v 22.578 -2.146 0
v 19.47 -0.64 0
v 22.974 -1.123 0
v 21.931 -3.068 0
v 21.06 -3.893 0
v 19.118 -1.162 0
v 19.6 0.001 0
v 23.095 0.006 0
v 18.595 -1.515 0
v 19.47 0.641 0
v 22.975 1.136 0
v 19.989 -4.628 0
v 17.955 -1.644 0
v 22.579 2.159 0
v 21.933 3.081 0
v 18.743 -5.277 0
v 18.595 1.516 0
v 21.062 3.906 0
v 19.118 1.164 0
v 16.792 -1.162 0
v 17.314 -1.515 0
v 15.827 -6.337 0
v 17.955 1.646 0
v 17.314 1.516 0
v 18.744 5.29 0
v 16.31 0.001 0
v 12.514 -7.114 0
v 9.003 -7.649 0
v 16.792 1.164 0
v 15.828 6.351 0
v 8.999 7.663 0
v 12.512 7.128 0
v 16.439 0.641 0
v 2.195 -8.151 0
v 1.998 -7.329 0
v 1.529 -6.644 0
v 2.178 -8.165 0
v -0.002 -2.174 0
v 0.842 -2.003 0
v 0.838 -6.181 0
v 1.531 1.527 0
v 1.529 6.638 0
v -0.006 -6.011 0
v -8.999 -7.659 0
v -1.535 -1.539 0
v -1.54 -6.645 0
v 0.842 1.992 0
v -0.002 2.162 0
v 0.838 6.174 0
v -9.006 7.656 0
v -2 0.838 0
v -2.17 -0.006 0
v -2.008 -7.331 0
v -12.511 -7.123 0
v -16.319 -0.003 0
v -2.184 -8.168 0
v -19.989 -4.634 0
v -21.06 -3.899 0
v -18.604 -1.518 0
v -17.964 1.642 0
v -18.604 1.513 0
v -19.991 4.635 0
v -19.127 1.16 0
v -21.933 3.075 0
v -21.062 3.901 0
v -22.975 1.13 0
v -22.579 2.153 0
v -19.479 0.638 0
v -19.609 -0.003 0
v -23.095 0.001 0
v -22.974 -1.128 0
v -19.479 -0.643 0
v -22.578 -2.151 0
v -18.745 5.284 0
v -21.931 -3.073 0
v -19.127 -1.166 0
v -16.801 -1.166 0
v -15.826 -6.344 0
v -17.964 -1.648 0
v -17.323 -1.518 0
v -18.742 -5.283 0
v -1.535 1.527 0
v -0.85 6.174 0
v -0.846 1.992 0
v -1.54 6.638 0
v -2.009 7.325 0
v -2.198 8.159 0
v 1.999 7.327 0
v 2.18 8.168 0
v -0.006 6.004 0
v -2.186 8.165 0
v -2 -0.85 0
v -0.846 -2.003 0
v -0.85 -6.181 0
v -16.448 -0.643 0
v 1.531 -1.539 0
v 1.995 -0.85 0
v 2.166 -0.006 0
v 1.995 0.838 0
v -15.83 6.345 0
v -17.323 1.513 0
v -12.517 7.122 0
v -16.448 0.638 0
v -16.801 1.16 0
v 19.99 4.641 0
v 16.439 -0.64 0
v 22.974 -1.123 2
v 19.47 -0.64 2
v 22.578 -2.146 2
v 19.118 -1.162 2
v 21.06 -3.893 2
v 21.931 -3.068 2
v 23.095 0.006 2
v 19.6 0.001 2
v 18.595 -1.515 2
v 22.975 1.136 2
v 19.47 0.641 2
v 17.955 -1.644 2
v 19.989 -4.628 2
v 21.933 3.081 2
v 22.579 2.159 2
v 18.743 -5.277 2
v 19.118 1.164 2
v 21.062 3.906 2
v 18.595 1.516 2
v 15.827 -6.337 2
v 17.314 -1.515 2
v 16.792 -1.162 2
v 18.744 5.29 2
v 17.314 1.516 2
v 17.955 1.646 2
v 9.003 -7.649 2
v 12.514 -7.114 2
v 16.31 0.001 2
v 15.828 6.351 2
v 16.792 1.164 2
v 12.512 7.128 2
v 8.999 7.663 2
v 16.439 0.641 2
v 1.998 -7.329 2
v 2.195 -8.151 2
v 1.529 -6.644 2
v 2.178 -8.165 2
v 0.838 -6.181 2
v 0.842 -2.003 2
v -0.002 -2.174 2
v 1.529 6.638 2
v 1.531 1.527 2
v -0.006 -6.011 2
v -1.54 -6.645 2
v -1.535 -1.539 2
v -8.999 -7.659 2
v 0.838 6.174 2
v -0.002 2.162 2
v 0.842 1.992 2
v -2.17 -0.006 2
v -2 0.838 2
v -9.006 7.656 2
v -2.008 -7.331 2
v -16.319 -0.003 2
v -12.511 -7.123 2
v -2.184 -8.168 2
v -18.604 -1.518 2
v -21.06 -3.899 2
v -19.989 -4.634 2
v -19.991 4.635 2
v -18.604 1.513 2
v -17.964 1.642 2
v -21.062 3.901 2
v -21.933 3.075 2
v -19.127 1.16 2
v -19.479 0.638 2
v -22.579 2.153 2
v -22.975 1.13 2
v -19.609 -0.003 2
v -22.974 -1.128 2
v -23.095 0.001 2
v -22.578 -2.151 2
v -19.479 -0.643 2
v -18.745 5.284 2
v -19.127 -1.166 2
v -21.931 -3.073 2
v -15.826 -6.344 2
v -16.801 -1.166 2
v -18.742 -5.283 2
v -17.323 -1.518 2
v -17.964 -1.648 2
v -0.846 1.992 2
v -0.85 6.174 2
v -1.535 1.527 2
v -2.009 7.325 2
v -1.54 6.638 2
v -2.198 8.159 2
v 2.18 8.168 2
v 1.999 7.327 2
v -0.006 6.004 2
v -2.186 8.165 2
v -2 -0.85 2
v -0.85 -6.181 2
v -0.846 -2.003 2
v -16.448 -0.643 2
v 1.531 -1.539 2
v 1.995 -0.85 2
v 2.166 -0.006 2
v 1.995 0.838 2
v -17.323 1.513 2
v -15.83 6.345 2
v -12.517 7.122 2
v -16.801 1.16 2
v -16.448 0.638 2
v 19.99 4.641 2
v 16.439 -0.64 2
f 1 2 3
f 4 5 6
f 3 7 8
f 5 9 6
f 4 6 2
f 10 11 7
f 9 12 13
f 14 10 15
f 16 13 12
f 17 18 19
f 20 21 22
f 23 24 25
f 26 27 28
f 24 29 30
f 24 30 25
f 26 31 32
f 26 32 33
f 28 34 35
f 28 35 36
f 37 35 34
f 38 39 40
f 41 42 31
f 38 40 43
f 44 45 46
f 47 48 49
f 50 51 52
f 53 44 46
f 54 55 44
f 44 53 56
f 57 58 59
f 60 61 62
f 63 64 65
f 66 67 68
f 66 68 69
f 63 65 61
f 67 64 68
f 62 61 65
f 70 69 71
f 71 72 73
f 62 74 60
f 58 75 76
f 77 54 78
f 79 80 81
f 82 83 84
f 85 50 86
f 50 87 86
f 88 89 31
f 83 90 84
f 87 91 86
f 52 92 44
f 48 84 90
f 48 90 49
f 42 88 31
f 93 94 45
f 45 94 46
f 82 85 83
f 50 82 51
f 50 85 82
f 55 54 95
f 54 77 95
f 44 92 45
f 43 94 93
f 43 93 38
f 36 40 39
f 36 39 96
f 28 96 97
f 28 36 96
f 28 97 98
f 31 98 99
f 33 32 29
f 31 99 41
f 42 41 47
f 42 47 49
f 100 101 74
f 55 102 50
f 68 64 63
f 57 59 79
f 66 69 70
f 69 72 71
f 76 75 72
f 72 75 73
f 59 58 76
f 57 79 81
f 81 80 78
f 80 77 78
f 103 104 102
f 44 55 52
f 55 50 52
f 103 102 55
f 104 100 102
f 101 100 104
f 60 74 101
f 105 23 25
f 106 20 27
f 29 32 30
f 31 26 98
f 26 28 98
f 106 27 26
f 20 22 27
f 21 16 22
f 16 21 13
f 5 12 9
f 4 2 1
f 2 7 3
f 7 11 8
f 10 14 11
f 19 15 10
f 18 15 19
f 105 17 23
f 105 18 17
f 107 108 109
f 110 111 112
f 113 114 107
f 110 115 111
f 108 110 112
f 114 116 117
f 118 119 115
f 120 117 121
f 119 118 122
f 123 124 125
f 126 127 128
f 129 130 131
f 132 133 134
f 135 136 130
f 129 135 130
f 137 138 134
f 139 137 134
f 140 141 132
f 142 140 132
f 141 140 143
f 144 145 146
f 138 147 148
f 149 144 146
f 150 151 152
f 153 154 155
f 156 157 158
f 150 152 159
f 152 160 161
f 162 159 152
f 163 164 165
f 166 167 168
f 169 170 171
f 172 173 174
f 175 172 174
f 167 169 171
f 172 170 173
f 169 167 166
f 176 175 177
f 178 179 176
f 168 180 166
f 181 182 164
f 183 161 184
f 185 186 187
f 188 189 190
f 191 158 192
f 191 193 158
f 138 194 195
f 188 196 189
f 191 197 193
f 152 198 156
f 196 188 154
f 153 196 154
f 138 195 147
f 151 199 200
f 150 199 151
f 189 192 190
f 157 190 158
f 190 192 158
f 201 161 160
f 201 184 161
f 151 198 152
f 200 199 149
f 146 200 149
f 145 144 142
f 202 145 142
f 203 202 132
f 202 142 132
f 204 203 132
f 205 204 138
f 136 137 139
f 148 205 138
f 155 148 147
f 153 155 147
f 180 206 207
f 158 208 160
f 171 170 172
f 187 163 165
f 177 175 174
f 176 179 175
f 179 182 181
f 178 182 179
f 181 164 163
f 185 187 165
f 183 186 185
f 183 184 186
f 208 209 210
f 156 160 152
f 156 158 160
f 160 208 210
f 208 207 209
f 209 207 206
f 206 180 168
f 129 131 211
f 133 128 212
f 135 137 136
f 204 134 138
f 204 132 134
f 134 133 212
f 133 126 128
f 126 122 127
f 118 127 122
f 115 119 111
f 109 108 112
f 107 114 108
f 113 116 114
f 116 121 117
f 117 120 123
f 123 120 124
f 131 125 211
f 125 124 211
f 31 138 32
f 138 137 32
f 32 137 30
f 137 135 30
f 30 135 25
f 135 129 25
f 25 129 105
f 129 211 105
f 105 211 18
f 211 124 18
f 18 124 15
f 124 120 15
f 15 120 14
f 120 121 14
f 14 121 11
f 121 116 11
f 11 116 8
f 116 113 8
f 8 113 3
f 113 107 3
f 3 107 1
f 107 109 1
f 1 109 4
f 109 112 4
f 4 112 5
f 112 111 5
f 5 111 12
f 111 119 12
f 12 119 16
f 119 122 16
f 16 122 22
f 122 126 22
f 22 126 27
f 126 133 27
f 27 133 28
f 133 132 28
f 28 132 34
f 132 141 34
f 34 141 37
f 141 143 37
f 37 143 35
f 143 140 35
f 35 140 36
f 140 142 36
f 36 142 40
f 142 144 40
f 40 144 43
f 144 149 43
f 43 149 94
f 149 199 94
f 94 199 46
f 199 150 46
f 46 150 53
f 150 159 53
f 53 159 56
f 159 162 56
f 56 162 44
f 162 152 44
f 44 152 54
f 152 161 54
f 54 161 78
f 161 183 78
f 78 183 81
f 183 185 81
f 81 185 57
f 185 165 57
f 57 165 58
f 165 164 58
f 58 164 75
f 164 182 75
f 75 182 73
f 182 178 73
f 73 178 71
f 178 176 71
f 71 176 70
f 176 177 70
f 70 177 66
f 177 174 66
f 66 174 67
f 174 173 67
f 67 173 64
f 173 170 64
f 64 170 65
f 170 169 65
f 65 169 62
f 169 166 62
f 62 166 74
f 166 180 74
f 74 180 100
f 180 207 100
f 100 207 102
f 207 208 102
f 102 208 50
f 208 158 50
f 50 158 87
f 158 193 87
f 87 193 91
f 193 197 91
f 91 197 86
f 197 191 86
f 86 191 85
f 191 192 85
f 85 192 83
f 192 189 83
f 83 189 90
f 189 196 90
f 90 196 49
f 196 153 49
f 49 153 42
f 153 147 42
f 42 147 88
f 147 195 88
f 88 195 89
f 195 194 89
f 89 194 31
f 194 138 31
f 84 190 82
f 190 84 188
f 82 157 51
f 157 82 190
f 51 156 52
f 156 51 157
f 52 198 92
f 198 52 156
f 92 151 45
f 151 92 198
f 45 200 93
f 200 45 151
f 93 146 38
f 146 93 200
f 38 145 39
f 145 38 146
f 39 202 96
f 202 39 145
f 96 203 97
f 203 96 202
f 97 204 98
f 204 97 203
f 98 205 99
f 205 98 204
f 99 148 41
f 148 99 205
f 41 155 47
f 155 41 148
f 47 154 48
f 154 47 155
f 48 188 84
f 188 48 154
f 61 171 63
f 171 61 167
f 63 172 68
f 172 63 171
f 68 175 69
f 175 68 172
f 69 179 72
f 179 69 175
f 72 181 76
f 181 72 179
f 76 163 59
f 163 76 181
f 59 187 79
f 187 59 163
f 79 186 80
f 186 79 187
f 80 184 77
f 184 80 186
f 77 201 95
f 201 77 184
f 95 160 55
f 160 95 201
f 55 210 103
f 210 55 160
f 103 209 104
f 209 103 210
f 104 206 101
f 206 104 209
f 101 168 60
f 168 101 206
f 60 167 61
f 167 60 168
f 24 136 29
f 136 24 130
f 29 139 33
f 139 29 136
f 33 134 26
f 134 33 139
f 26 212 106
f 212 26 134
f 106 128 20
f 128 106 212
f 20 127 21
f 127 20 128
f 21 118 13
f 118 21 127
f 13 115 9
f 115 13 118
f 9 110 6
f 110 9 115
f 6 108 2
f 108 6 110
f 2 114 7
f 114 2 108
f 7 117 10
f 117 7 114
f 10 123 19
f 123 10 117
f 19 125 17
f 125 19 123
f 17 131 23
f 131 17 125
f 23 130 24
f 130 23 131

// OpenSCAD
//profile_scale = 1;         // for 4 cm   pouch = 7   mm steel ball
profile_scale = 1.125;     // for 4.5 cm pouch = 8   mm steel ball
//profile_scale = 1.25;      // for 5.0 cm pouch = 10  mm steel ball
//profile_scale = 1.375;     // for 5.5 cm pouch = 11+ mm steel ball

height = 2;   // height in mm of the stencil


// helper functions to determine the X,Y dimensions of the profiles
function min_x(shape_points) = min([ for (x = shape_points) min(x[0])]);
function max_x(shape_points) = max([ for (x = shape_points) max(x[0])]);
function min_y(shape_points) = min([ for (x = shape_points) min(x[1])]);
function max_y(shape_points) = max([ for (x = shape_points) max(x[1])]);


path5239362_0_points = [[-0.005384,5.343160],[0.744980,5.494414],[1.359135,5.906074],[1.776443,6.514990],[1.936266,7.258010],[1.950743,7.245710],[8.002938,6.799032],[11.123345,6.323985],[14.068653,5.633219],[16.660385,4.690797],[17.767885,4.113985],[18.720062,3.460784],[19.494605,2.726701],[20.069206,1.907244],[20.421553,0.997921],[20.529338,-0.005760],[20.422055,-1.009441],[20.070123,-1.918770],[19.495833,-2.738243],[18.721475,-3.472357],[17.769340,-4.125609],[16.661719,-4.702496],[14.069182,-5.645164],[11.122190,-6.336335],[7.999068,-6.811986],[1.937741,-7.260630],[1.777118,-6.512453],[1.359399,-5.900889],[0.745092,-5.488253],[-0.005294,-5.336860],[-0.755597,-5.488214],[-1.369326,-5.900576],[-1.785475,-6.511398],[-1.943040,-7.258130],[-1.953627,-7.252130],[-8.005778,-6.805452],[-11.126078,-6.330405],[-14.071178,-5.639639],[-16.662567,-4.697217],[-17.769834,-4.120405],[-18.721731,-3.467204],[-19.495944,-2.733121],[-20.070159,-1.913664],[-20.422061,-1.004341],[-20.529338,-0.000660],[-20.421549,1.003023],[-20.069184,1.912363],[-19.494539,2.731865],[-18.719912,3.466037],[-17.767599,4.119385],[-16.659896,4.696415],[-14.067505,5.639546],[-11.121113,6.331482],[-7.999090,6.808275],[-1.941638,7.260630],[-1.784937,6.516164],[-1.369231,5.906506],[-0.755665,5.494573],[-0.005384,5.343280],[-0.005384,5.343160],[-14.505699,0.002380],[-14.620595,0.571484],[-14.933927,1.036220],[-15.398663,1.349553],[-15.967766,1.464450],[-16.536870,1.349553],[-17.001605,1.036220],[-17.314938,0.571484],[-17.429833,0.002380],[-17.314938,-0.566724],[-17.001605,-1.031460],[-16.536870,-1.344793],[-15.967766,-1.459690],[-15.398663,-1.344793],[-14.933927,-1.031460],[-14.620595,-0.566724],[-14.505699,0.002380],[-14.505699,0.002380],[17.421814,-0.000620],[17.306918,0.568484],[16.993586,1.033220],[16.528850,1.346553],[15.959747,1.461450],[15.390643,1.346553],[14.925908,1.033220],[14.612575,0.568484],[14.497680,-0.000620],[14.612578,-0.569718],[14.925912,-1.034451],[15.390646,-1.347784],[15.959747,-1.462680],[16.528848,-1.347784],[16.993582,-1.034451],[17.306915,-0.569718],[17.421814,-0.000620],[17.421814,-0.000620],[1.925198,0.005040],[1.773751,0.755177],[1.360744,1.367747],[0.748174,1.780754],[-0.001964,1.932200],[-0.752102,1.780754],[-1.364673,1.367747],[-1.777680,0.755177],[-1.929127,0.005040],[-1.777683,-0.745103],[-1.364677,-1.357676],[-0.752105,-1.770684],[-0.001964,-1.922130],[0.748176,-1.770684],[1.360748,-1.357676],[1.773754,-0.745103],[1.925198,0.005040],[1.925198,0.005040]];
path5239362_0_paths = [[0,1,2,3,4,5,6,7,8,9,10,11,12,13,14,15,16,17,18,19,20,21,22,23,24,25,26,27,28,29,30,31,32,33,34,35,36,37,38,39,40,41,42,43,44,45,46,47,48,49,50,51,52,53,54,55,56,57,58,59],
				[60,61,62,63,64,65,66,67,68,69,70,71,72,73,74,75,76,77],
				[78,79,80,81,82,83,84,85,86,87,88,89,90,91,92,93,94,95],
				[96,97,98,99,100,101,102,103,104,105,106,107,108,109,110,111,112,113]];

module poly_path5239362(h, res=4)  {
  scale([profile_scale, -profile_scale, 1])
  union()  {
    linear_extrude(height=h)
      polygon(path5239362_0_points, path5239362_0_paths);
  }
}

// The shapes
poly_path5239362(height);
